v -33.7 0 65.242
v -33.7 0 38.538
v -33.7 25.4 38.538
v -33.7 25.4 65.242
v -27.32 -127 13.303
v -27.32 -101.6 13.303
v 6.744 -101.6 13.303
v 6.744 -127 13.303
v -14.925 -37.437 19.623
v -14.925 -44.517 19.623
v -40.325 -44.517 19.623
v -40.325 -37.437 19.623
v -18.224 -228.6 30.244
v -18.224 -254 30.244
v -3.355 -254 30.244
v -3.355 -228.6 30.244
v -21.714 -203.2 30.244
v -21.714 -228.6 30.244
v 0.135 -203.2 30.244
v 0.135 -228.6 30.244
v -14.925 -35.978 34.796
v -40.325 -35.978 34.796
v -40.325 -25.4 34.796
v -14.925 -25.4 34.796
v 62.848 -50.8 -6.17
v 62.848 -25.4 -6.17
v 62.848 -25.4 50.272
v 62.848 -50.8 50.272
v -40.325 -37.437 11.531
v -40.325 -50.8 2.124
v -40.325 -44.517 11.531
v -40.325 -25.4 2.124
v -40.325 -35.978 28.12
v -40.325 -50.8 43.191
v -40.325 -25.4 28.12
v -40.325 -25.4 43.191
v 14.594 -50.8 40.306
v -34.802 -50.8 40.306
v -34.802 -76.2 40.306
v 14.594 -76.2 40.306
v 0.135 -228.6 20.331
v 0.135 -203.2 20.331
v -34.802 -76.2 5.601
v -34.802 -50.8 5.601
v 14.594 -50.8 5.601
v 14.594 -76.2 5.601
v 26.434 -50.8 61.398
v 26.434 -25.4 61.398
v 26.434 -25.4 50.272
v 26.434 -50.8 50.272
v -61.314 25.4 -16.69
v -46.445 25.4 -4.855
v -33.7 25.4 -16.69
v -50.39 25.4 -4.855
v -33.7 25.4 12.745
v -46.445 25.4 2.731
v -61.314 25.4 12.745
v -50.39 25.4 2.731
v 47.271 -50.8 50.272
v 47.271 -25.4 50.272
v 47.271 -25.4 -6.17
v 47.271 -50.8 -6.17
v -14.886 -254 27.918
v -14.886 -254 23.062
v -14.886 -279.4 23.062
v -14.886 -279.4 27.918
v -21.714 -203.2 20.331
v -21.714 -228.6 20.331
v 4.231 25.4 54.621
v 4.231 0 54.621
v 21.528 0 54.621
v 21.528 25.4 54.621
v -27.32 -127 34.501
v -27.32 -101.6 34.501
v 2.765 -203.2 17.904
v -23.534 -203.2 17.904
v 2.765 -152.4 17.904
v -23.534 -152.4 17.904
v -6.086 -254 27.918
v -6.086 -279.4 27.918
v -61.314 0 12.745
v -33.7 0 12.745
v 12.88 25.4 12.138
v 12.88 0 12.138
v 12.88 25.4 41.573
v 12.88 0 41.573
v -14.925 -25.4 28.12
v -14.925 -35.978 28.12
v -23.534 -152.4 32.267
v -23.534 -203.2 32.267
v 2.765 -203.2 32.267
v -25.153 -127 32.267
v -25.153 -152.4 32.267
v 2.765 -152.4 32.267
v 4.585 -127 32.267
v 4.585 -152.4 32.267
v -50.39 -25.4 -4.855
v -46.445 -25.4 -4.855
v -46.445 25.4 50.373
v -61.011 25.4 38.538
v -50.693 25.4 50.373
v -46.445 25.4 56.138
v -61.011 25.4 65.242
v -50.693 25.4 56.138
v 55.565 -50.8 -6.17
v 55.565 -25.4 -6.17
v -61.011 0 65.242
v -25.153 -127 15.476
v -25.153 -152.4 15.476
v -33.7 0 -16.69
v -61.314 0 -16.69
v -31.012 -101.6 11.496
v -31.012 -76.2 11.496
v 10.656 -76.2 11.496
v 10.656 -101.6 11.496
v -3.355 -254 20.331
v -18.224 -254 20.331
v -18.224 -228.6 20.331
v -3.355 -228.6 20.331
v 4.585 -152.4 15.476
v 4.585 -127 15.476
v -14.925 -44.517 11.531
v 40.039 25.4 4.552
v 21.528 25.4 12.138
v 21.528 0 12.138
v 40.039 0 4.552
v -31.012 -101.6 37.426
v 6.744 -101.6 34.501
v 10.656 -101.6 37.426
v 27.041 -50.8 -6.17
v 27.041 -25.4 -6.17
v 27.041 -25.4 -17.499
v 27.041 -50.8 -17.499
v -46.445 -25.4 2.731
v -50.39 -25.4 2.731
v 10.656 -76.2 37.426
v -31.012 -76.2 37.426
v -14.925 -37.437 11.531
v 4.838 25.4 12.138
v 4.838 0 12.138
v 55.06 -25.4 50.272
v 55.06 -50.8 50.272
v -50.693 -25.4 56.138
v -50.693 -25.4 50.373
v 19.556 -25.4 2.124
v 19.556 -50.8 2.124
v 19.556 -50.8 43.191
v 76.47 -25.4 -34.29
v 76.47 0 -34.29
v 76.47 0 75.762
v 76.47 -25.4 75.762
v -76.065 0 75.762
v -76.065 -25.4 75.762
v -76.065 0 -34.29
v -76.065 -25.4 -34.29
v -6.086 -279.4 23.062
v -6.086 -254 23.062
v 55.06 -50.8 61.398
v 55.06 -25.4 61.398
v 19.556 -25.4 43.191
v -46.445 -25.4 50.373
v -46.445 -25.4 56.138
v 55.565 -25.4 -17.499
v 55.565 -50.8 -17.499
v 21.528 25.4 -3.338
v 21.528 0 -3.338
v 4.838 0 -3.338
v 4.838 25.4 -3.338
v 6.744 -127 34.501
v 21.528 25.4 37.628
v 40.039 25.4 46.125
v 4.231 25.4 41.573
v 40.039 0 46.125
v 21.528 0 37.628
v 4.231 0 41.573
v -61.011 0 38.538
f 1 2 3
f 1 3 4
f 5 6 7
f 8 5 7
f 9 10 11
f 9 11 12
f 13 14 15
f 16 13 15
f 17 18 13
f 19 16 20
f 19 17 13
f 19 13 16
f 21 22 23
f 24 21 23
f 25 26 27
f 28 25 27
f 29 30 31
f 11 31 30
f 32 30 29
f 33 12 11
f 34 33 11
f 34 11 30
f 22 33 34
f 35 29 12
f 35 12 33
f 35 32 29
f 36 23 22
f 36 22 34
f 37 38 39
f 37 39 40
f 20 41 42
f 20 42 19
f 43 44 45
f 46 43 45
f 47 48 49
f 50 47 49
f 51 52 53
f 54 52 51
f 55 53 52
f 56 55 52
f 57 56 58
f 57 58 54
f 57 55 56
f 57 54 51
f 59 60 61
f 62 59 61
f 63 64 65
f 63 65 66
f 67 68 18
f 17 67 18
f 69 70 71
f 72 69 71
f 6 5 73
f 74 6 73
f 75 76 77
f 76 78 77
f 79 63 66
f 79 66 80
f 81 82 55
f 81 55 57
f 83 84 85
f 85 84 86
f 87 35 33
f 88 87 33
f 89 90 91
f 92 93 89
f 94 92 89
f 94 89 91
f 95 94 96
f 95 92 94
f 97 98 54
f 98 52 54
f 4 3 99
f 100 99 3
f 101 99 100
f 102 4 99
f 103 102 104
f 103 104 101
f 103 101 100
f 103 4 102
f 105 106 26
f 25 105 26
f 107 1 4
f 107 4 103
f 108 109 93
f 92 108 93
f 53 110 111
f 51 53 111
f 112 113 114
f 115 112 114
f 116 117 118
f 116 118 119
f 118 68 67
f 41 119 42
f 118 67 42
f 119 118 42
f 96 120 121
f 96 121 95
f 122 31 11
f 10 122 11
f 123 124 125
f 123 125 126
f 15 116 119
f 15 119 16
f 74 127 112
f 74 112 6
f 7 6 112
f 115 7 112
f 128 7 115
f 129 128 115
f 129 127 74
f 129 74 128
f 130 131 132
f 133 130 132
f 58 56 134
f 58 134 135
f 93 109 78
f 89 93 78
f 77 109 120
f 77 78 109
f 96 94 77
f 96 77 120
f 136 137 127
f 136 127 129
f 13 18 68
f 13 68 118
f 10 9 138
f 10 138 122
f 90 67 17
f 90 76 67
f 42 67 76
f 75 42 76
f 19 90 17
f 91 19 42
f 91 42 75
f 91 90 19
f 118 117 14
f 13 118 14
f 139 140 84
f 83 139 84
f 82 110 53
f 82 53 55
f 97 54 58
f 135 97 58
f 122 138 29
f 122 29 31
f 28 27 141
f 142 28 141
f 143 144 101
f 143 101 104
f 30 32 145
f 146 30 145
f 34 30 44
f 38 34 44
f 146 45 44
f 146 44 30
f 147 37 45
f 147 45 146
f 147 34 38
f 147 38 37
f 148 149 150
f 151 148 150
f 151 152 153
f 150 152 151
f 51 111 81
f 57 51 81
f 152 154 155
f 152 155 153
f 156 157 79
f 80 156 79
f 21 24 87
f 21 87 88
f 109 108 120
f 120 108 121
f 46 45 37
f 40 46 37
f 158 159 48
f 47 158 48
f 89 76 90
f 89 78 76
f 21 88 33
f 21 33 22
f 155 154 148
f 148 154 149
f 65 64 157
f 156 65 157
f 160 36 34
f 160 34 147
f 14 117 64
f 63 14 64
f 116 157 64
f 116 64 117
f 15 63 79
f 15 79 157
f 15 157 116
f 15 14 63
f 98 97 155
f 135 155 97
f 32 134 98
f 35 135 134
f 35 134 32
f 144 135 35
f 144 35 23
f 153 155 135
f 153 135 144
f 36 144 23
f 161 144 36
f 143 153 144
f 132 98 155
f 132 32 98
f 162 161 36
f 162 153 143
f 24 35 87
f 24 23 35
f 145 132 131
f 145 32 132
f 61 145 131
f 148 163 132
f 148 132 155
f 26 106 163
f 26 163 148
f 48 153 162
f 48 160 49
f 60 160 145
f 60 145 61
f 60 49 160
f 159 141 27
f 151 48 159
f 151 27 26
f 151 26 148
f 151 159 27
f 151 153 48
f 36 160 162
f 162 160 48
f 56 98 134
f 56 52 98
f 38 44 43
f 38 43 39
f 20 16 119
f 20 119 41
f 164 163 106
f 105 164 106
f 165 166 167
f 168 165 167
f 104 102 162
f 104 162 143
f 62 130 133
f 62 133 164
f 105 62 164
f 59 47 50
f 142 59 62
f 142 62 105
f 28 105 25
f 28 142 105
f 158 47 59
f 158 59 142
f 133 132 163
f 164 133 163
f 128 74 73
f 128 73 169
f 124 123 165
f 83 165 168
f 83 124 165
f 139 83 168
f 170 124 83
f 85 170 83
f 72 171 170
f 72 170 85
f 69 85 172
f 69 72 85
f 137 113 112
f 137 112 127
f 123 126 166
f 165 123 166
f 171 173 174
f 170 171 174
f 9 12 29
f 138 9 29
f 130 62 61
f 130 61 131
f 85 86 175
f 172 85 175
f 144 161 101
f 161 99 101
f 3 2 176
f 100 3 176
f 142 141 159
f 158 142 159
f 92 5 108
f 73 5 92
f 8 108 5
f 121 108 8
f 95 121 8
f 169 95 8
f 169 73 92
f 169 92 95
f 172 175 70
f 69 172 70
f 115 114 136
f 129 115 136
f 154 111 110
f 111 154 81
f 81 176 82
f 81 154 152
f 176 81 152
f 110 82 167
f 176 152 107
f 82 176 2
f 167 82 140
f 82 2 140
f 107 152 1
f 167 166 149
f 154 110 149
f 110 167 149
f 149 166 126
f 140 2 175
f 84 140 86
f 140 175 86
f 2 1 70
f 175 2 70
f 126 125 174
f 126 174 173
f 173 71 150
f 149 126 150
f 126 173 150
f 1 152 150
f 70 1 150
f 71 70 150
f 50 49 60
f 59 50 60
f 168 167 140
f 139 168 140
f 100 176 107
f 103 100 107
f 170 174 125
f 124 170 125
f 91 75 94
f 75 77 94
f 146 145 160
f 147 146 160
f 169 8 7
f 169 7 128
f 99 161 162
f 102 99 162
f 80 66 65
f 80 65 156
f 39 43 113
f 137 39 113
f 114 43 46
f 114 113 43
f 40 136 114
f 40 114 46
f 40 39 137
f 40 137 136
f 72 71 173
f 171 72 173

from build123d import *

# Parameters (mm, degrees)
F0_W      = 152.5348722935
F0_H      = 110.0516840816
F1_DEPTH  = 25.4
F2_W      = 59.8810613155
F2_H      = 41.0670798738
F3_DEPTH  = 25.4
F5_DEPTH  = 25.4
F6_W      = 3.5402644426
F6_H      = 4.0460177697
F7_DEPTH  = 25.4
F8_W      = 49.3959197775
F8_H      = 34.7048761323
F9_DEPTH  = 25.4
F10_W     = 41.6679419577
F10_H     = 25.9291101247
F11_DEPTH = 25.4
F12_W     = 34.0640768409
F12_H     = 21.1985725909
F13_DEPTH = 25.4
F14_W     = 29.7382287681
F14_H     = 16.7909711599
F15_DEPTH = 25.4
F16_W     = 26.2991152704
F16_H     = 14.3633615226
F16_W_2   = 22.8600006667
F16_H_2   = 10.3173442185
F17_DEPTH = 25.4
F18_W     = 26.2991152704
F18_H     = 14.3633615226
F18_W_2   = 22.4553988955
F18_H_2   = 10.1150441915
F18_W_3   = 14.3633633852
F18_H_3   = 4.6529192477
F18_W_4   = 8.4966383874
F18_H_4   = 1.4161076397
F19_DEPTH = 25.4
F20_W     = 21.8484961079
F20_H     = 9.9127423018
F21_DEPTH = 25.4
F22_W     = 14.8691139184
F22_H     = 9.9127423018
F23_DEPTH = 25.4
F24_W     = 8.8000879623
F24_H     = 4.8552211374
F25_DEPTH = 25.4
F26_W     = 27.6140682399
F26_H     = 29.4347768649
F26_W_2   = 9.7104460001
F26_H_2   = 15.1725648902
F26_W_3   = 27.3106172681
F26_H_3   = 26.7037190497
F26_W_4   = 11.2277008593
F26_H_4   = 11.5311481059
F26_W_5   = 3.9448663592
F26_H_5   = 7.5862845405
F26_W_6   = 4.2483173311
F26_H_6   = 5.7655721903
F27_DEPTH = 25.4
F28_DEPTH = 25.4
F30_DEPTH = 25.4


with BuildPart() as f1:
    # F0 (on Front) → F1 (new body)
    with BuildSketch(Plane.XZ):
        with Locations((0.2022981644, 20.7358412445)):
            Rectangle(F0_W, F0_H)
    extrude(amount=F1_DEPTH)

    # F2 (on face) → F3 (join)
    with BuildSketch(Plane.XZ.offset(25.4)):
        with Locations((-10.3847794235, 22.6576993009)):
            Rectangle(F2_W, F2_H)
    extrude(amount=F3_DEPTH)

    # F4 (on face) → F5 (cut)
    with BuildSketch(Plane(origin=(-40.3253100812, 0, 0), x_dir=(0, -1, 0), z_dir=(-1, 0, 0))):
        Polygon((35.9776653349, 34.7957536578), (25.4, 34.7957536578), (25.4, 28.1198229641), (30.6888326675, 28.1198229641), (35.9776653349, 28.1198229641), align=None)
    extrude(amount=-F5_DEPTH, mode=Mode.SUBTRACT)

    # F6 (on face) → F7 (cut)
    with BuildSketch(Plane(origin=(-40.3253100812, 0, 0), x_dir=(0, -1, 0), z_dir=(-1, 0, 0))):
        with Locations((39.2070347443, 17.6001775544)):
            Rectangle(F6_W, F6_H)
        with Locations((39.2070347443, 13.5541597847)):
            Rectangle(F6_W, F6_H)
        with Locations((42.7472991869, 13.5541597847)):
            Rectangle(F6_W, F6_H)
        with Locations((42.7472991869, 17.6001775544)):
            Rectangle(F6_W, F6_H)
    extrude(amount=-F7_DEPTH, mode=Mode.SUBTRACT)

    # F8 (on face) → F9 (join)
    with BuildSketch(Plane.XZ.offset(50.8)):
        with Locations((-10.1041528396, 22.9534148239)):
            Rectangle(F8_W, F8_H)
    extrude(amount=F9_DEPTH)

    # F10 (on face) → F11 (join)
    with BuildSketch(Plane.XZ.offset(76.2)):
        with Locations((-10.1783443242, 24.4610188529)):
            Rectangle(F10_W, F10_H)
    extrude(amount=F11_DEPTH)

    # F12 (on face) → F13 (join)
    with BuildSketch(Plane.XZ.offset(101.6)):
        with Locations((-10.288214311, 23.9018974826)):
            Rectangle(F12_W, F12_H)
    extrude(amount=F13_DEPTH)

    # F14 (on face) → F15 (join)
    with BuildSketch(Plane.XZ.offset(127)):
        with Locations((-10.2836284786, 23.8715037704)):
            Rectangle(F14_W, F14_H)
    extrude(amount=F15_DEPTH)

    # F16 (on face) → F17 (join)
    with BuildSketch(Plane.XZ.offset(152.4)):
        with Locations((-10.3847794235, 25.085308589)):
            Rectangle(F16_W, F16_H)
        with Locations((-10.6882309483, 25.489911437)):
            Rectangle(F16_W_2, F16_H_2, mode=Mode.SUBTRACT)
        with Locations((-10.6882309483, 25.489911437)):
            Rectangle(F16_W_2, F16_H_2)
    extrude(amount=F17_DEPTH)

    # F18 (on face) → F19 (join)
    with BuildSketch(Plane.XZ.offset(177.8)):
        with Locations((-10.3847794235, 25.085308589)):
            Rectangle(F18_W, F18_H)
        with Locations((-10.8905318339, 25.3887614235)):
            Rectangle(F18_W_2, F18_H_2, mode=Mode.SUBTRACT)
        with Locations((-10.8905318339, 25.3887614235)):
            Rectangle(F18_W_2, F18_H_2)
        Polygon((-2.0904429257, 22.3542470485), (-20.499823615, 22.3542470485), (-20.499823615, 28.8278758526), (-18.6791159213, 28.8278758526), (-4.3157525361, 28.8278758526), (-2.0904429257, 28.8278758526), align=None, mode=Mode.SUBTRACT)
        Polygon((-20.499823615, 28.8278758526), (-20.499823615, 22.3542470485), (-2.0904429257, 22.3542470485), (-2.0904429257, 28.8278758526), (-4.3157525361, 28.8278758526), (-4.3157525361, 24.1749566048), (-18.6791159213, 24.1749566048), (-18.6791159213, 28.8278758526), align=None)
        with Locations((-11.4974342287, 26.5014162287)):
            Rectangle(F18_W_3, F18_H_3)
        with Locations((-12.2054871172, 26.5014162287)):
            Rectangle(F18_W_4, F18_H_4, mode=Mode.SUBTRACT)
        with Locations((-12.2054871172, 26.5014162287)):
            Rectangle(F18_W_4, F18_H_4)
    extrude(amount=F19_DEPTH)

    # F20 (on face) → F21 (join)
    with BuildSketch(Plane.XZ.offset(203.2)):
        with Locations((-10.789381311, 25.2876104787)):
            Rectangle(F20_W, F20_H)
    extrude(amount=F21_DEPTH)

    # F22 (on face) → F23 (join)
    with BuildSketch(Plane.XZ.offset(228.6)):
        with Locations((-10.7893806417, 25.2876104787)):
            Rectangle(F22_W, F22_H)
    extrude(amount=F23_DEPTH)

    # F24 (on face) → F25 (join)
    with BuildSketch(Plane.XZ.offset(254)):
        with Locations((-10.4859292042, 25.4899105057)):
            Rectangle(F24_W, F24_H)
    extrude(amount=F25_DEPTH)

    # F26 (on face) → F27 (join)
    with BuildSketch(Plane(origin=(0, 0, 0), x_dir=(-1, 0, 0), z_dir=(0, 1, 0))):
        with Locations((47.5069899112, -1.9724336453)):
            Rectangle(F26_W, F26_H)
        with Locations((47.962166369, -1.2138050515)):
            Rectangle(F26_W_2, F26_H_2, mode=Mode.SUBTRACT)
        with Locations((47.3552644253, 51.8901776522)):
            Rectangle(F26_W_3, F26_H_3)
        with Locations((48.1138918549, 53.1039815396)):
            Rectangle(F26_W_4, F26_H_4, mode=Mode.SUBTRACT)
        Polygon((-4.8383618705, 12.1380519122), (-12.8798228689, 12.1380519122), (-21.5281862766, 12.1380519122), (-21.5281862766, -3.3379644156), (-4.8383618705, -3.3379644156), align=None)
        Polygon((-12.8798228689, 41.5728315711), (-21.5281862766, 41.5728315711), (-21.5281862766, 37.6279652119), (-21.5281862766, 12.1380519122), (-12.8798228689, 12.1380519122), align=None)
        Polygon((-4.2314594612, 41.5728315711), (-4.2314594612, 54.6212382615), (-21.5281862766, 54.6212382615), (-21.5281862766, 41.5728315711), (-12.8798228689, 41.5728315711), align=None)
        Polygon((-21.5281862766, 41.5728315711), (-21.5281862766, 54.6212382615), (-40.0387123227, 46.124599874), (-21.5281862766, 37.6279652119), align=None)
        with Locations((47.962166369, -1.2138050515)):
            Rectangle(F26_W_2, F26_H_2)
        with Locations((48.4173446894, -1.0620807297)):
            Rectangle(F26_W_5, F26_H_5, mode=Mode.SUBTRACT)
        Polygon((-21.5281862766, -3.3379644156), (-21.5281862766, 12.1380519122), (-40.0387123227, 4.5517692342), align=None)
        with Locations((48.1138918549, 53.1039815396)):
            Rectangle(F26_W_4, F26_H_4)
        with Locations((48.5690701753, 53.2557070255)):
            Rectangle(F26_W_6, F26_H_6, mode=Mode.SUBTRACT)
    extrude(amount=F27_DEPTH)

    # F28 (cut): faces of the model
    f28_faces = [f1.faces().sort_by_distance(p)[0] for p in [
        (-48.5690701753, 0, 53.2557070255),
        (-48.4173446894, 0, -1.0620807297),
    ]]
    extrude(f28_faces, amount=-F28_DEPTH, mode=Mode.SUBTRACT)

    # F29 (on face) → F30 (join)
    with BuildSketch(Plane.XZ.offset(25.4)):
        Polygon((26.4339819551, 50.2717718482), (47.270976007, 50.2717718482), (55.059555918, 50.2717718482), (55.059555918, 61.3983161747), (26.4339819551, 61.3983161747), align=None)
        Polygon((47.270976007, 50.2717718482), (47.270976007, -6.1701769009), (55.5653087795, -6.1701769009), (62.848135829, -6.1701769009), (62.848135829, 50.2717718482), (55.059555918, 50.2717718482), align=None)
        Polygon((47.270976007, -6.1701769009), (27.0408838987, -6.1701769009), (27.0408838987, -17.4990277737), (55.5653087795, -17.4990277737), (55.5653087795, -6.1701769009), align=None)
    extrude(amount=F30_DEPTH)


solid = f1.part
